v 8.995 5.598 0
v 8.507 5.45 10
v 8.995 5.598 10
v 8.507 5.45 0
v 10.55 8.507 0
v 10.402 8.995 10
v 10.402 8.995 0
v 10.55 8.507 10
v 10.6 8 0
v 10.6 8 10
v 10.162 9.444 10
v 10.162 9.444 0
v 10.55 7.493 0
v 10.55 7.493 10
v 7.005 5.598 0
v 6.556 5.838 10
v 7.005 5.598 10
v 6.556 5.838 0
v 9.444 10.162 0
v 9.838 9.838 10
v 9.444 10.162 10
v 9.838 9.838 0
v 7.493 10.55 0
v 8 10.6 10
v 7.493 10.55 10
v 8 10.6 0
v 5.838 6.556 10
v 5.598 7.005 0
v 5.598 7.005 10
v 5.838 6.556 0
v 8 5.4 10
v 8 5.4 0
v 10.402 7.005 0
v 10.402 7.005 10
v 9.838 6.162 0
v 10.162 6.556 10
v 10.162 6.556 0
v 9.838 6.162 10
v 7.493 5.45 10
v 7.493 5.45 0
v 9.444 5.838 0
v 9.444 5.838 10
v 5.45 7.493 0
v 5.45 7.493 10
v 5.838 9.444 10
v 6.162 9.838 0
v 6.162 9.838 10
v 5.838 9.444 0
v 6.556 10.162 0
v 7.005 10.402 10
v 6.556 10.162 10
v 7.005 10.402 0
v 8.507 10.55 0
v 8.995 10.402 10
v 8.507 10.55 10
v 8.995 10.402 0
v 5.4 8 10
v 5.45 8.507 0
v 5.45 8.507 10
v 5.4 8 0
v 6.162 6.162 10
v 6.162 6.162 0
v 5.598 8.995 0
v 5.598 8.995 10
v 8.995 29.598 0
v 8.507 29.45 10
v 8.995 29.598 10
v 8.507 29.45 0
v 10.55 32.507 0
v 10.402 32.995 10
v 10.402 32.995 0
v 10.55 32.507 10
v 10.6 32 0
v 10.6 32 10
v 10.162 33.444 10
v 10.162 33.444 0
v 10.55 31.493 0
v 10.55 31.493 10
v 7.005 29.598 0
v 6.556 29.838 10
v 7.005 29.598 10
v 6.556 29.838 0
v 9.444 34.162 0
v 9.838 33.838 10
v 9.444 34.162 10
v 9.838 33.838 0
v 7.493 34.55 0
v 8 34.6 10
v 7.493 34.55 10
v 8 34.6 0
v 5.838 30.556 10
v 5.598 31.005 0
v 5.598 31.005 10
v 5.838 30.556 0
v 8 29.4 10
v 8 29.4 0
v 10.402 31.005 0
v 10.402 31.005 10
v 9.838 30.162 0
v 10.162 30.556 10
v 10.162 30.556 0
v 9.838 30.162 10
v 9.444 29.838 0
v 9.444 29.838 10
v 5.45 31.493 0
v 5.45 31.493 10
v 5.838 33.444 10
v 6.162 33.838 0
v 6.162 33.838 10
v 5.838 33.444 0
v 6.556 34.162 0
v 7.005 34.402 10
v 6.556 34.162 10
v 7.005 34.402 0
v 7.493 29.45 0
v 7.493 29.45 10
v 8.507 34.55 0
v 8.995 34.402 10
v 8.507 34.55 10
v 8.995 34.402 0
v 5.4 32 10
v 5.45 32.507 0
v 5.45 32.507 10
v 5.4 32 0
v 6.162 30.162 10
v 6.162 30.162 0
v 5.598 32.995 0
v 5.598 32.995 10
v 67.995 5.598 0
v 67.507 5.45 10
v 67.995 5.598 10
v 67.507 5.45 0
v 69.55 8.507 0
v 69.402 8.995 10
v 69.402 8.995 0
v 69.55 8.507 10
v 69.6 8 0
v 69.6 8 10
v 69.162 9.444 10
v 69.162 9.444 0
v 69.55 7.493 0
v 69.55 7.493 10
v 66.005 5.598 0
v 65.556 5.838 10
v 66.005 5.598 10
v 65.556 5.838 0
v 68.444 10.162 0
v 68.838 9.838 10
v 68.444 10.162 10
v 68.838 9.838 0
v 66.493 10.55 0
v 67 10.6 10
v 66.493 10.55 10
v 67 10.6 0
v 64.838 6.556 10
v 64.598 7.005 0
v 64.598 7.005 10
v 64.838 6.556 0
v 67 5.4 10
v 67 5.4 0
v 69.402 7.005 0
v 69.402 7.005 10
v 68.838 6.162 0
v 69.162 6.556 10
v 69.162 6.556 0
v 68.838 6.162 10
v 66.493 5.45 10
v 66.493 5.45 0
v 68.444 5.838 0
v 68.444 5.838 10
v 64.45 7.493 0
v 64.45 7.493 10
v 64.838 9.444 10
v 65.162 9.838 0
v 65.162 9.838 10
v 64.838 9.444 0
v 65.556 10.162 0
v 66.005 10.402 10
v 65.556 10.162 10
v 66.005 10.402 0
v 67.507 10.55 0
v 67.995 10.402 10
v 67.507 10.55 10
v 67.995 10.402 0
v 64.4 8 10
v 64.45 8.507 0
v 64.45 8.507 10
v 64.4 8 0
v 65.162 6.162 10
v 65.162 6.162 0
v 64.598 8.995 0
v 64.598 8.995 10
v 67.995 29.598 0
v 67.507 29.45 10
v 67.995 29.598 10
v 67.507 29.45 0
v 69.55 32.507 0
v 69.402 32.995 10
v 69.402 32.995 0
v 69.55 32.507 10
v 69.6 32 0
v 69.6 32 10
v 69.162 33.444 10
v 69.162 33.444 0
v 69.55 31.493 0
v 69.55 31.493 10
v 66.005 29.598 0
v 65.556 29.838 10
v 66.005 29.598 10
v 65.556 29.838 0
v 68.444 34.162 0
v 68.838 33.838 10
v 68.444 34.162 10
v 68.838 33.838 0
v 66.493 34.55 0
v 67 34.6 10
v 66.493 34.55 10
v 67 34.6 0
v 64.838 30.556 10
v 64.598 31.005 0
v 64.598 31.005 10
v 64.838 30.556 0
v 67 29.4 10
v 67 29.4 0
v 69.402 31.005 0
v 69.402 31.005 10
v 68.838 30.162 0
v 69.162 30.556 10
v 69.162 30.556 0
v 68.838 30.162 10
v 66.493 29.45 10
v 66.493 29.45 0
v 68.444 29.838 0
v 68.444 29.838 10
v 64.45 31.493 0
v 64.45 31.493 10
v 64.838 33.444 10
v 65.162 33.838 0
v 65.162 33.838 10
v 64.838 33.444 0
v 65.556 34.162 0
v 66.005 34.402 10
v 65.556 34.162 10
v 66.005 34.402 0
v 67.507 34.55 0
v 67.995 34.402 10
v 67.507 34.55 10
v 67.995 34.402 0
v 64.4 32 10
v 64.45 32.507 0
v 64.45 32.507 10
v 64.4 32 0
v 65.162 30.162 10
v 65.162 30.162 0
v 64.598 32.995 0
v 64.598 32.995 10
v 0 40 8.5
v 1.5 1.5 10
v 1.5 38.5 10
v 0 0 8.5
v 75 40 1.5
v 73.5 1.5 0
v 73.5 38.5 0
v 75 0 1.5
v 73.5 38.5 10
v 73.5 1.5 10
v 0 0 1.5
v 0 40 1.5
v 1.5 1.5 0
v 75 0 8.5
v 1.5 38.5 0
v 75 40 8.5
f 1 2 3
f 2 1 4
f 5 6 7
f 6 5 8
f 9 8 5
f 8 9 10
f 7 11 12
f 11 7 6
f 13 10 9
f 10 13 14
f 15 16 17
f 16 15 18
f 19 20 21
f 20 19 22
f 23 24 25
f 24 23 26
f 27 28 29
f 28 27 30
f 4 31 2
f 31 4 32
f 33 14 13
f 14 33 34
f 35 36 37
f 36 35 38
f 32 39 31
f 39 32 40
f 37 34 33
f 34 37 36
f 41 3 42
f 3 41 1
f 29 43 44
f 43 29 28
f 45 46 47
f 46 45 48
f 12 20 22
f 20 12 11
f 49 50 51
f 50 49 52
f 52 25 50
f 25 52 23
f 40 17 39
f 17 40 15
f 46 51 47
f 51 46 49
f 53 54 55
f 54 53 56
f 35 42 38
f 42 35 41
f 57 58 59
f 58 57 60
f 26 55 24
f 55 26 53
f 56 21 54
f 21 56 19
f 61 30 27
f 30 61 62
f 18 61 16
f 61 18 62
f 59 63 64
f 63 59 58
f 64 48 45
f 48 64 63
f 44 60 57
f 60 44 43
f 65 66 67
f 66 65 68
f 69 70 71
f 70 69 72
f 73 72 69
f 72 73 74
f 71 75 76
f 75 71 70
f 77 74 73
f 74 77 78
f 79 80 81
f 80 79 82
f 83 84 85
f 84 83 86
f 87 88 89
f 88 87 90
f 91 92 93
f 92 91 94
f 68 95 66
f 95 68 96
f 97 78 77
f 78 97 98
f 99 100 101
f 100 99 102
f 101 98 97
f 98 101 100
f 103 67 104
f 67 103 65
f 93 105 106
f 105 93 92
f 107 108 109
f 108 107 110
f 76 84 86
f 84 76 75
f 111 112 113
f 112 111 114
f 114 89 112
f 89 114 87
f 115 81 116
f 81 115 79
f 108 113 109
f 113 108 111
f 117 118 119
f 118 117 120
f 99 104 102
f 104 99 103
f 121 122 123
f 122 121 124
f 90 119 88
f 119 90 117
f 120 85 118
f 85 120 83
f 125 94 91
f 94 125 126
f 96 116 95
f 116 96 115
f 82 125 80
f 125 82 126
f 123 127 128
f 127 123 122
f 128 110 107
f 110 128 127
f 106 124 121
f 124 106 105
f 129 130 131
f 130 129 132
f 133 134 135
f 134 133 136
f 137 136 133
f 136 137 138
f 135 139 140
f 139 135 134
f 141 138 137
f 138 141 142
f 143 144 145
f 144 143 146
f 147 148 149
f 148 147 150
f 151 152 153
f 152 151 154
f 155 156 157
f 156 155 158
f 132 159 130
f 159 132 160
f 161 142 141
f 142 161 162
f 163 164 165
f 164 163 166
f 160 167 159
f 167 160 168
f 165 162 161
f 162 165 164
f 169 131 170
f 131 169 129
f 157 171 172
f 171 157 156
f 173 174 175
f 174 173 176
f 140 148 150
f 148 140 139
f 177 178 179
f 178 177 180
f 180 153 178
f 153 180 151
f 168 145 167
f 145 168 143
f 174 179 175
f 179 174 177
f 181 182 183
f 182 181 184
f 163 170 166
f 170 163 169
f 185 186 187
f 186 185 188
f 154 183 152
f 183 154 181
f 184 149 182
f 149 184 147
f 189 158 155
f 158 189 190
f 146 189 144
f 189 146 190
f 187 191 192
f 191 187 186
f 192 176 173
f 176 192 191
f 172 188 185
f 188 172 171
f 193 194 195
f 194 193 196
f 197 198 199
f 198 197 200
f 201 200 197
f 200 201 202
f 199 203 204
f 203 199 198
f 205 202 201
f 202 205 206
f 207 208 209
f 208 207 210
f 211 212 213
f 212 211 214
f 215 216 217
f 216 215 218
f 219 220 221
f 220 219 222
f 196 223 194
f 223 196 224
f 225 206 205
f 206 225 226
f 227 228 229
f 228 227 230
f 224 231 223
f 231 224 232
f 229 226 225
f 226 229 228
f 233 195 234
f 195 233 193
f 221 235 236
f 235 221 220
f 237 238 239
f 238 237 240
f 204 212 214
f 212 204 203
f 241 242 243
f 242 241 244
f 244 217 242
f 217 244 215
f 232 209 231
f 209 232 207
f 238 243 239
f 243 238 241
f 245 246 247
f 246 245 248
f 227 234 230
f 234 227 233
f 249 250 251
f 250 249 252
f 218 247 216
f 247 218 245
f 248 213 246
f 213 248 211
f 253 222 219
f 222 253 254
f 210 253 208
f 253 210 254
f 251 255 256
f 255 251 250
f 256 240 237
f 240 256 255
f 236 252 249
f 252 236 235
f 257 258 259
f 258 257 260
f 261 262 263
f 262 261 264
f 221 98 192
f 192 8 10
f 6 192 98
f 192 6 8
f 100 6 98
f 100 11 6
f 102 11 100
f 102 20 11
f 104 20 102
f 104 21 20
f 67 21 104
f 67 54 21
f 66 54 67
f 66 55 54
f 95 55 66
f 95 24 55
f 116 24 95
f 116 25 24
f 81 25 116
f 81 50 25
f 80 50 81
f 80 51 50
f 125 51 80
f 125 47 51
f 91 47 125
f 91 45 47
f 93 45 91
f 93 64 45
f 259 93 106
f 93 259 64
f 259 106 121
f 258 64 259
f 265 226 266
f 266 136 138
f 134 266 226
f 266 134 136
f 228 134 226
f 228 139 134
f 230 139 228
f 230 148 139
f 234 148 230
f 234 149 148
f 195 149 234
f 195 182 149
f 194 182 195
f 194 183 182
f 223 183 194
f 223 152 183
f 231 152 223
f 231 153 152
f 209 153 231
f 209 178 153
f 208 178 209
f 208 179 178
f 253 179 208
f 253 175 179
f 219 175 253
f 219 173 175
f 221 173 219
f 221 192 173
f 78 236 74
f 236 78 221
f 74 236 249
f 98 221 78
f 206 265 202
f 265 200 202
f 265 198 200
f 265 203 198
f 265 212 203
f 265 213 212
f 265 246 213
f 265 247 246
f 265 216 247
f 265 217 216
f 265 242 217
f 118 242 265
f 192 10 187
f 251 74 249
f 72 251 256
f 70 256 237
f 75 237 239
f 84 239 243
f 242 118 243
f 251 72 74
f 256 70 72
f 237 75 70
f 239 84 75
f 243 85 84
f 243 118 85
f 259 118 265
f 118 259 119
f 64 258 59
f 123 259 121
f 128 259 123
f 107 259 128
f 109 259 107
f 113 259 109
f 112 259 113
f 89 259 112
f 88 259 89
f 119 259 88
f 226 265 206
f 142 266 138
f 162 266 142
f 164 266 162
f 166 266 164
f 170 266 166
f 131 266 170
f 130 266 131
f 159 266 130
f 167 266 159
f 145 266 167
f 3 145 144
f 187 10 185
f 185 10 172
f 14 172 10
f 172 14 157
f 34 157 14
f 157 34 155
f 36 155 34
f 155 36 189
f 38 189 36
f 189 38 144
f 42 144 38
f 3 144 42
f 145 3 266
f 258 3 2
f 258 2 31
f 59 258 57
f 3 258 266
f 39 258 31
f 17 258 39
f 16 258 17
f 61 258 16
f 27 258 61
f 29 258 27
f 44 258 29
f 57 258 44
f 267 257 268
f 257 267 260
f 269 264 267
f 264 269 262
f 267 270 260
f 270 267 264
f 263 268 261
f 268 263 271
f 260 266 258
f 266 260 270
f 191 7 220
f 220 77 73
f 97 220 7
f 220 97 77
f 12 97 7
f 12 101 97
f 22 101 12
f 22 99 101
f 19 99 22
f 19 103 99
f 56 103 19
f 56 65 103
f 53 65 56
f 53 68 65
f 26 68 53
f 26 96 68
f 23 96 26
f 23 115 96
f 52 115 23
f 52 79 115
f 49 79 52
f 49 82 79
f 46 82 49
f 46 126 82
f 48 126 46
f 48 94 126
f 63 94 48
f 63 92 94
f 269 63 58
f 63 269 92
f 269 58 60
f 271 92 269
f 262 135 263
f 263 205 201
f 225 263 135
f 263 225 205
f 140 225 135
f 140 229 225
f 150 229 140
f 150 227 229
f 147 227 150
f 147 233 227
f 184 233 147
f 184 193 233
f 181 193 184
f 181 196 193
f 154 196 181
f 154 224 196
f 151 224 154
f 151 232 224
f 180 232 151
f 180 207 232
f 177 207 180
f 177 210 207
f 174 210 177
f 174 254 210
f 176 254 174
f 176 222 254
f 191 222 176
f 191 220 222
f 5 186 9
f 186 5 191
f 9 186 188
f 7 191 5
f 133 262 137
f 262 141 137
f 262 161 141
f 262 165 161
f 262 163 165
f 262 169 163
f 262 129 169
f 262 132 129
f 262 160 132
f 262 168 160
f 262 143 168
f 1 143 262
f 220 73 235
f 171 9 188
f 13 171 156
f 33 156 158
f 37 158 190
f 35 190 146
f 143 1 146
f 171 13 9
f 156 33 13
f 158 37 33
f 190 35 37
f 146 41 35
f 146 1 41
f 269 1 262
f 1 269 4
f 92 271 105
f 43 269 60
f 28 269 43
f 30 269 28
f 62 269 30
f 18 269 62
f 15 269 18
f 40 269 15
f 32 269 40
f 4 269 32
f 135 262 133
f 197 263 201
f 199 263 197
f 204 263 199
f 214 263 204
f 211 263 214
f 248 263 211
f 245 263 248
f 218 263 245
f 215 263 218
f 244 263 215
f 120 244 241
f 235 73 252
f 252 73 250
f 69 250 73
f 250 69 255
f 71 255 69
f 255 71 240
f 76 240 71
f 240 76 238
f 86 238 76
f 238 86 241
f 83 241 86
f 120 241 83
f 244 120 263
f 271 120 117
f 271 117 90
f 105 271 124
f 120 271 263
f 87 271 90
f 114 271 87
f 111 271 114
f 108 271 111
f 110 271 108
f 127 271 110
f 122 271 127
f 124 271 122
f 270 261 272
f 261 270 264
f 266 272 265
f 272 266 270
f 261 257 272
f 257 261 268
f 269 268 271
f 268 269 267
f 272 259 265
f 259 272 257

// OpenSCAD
$fn = 32;
// Chamfered mounting plate 75x40x10 mm.

width = 75;
depth = 40;
thickness = 10;
chamfer = 1.5;
hole_d = 5.2;
inset = 8;

difference() {
    hull() {
        translate([chamfer, chamfer, 0])
            cube([width - 2 * chamfer, depth - 2 * chamfer, thickness]);
        translate([0, 0, chamfer])
            cube([width, depth, thickness - 2 * chamfer]);
    }
    for (x = [inset, width - inset], y = [inset, depth - inset])
        translate([x, y, -1]) cylinder(h = thickness + 2, d = hole_d);
}
